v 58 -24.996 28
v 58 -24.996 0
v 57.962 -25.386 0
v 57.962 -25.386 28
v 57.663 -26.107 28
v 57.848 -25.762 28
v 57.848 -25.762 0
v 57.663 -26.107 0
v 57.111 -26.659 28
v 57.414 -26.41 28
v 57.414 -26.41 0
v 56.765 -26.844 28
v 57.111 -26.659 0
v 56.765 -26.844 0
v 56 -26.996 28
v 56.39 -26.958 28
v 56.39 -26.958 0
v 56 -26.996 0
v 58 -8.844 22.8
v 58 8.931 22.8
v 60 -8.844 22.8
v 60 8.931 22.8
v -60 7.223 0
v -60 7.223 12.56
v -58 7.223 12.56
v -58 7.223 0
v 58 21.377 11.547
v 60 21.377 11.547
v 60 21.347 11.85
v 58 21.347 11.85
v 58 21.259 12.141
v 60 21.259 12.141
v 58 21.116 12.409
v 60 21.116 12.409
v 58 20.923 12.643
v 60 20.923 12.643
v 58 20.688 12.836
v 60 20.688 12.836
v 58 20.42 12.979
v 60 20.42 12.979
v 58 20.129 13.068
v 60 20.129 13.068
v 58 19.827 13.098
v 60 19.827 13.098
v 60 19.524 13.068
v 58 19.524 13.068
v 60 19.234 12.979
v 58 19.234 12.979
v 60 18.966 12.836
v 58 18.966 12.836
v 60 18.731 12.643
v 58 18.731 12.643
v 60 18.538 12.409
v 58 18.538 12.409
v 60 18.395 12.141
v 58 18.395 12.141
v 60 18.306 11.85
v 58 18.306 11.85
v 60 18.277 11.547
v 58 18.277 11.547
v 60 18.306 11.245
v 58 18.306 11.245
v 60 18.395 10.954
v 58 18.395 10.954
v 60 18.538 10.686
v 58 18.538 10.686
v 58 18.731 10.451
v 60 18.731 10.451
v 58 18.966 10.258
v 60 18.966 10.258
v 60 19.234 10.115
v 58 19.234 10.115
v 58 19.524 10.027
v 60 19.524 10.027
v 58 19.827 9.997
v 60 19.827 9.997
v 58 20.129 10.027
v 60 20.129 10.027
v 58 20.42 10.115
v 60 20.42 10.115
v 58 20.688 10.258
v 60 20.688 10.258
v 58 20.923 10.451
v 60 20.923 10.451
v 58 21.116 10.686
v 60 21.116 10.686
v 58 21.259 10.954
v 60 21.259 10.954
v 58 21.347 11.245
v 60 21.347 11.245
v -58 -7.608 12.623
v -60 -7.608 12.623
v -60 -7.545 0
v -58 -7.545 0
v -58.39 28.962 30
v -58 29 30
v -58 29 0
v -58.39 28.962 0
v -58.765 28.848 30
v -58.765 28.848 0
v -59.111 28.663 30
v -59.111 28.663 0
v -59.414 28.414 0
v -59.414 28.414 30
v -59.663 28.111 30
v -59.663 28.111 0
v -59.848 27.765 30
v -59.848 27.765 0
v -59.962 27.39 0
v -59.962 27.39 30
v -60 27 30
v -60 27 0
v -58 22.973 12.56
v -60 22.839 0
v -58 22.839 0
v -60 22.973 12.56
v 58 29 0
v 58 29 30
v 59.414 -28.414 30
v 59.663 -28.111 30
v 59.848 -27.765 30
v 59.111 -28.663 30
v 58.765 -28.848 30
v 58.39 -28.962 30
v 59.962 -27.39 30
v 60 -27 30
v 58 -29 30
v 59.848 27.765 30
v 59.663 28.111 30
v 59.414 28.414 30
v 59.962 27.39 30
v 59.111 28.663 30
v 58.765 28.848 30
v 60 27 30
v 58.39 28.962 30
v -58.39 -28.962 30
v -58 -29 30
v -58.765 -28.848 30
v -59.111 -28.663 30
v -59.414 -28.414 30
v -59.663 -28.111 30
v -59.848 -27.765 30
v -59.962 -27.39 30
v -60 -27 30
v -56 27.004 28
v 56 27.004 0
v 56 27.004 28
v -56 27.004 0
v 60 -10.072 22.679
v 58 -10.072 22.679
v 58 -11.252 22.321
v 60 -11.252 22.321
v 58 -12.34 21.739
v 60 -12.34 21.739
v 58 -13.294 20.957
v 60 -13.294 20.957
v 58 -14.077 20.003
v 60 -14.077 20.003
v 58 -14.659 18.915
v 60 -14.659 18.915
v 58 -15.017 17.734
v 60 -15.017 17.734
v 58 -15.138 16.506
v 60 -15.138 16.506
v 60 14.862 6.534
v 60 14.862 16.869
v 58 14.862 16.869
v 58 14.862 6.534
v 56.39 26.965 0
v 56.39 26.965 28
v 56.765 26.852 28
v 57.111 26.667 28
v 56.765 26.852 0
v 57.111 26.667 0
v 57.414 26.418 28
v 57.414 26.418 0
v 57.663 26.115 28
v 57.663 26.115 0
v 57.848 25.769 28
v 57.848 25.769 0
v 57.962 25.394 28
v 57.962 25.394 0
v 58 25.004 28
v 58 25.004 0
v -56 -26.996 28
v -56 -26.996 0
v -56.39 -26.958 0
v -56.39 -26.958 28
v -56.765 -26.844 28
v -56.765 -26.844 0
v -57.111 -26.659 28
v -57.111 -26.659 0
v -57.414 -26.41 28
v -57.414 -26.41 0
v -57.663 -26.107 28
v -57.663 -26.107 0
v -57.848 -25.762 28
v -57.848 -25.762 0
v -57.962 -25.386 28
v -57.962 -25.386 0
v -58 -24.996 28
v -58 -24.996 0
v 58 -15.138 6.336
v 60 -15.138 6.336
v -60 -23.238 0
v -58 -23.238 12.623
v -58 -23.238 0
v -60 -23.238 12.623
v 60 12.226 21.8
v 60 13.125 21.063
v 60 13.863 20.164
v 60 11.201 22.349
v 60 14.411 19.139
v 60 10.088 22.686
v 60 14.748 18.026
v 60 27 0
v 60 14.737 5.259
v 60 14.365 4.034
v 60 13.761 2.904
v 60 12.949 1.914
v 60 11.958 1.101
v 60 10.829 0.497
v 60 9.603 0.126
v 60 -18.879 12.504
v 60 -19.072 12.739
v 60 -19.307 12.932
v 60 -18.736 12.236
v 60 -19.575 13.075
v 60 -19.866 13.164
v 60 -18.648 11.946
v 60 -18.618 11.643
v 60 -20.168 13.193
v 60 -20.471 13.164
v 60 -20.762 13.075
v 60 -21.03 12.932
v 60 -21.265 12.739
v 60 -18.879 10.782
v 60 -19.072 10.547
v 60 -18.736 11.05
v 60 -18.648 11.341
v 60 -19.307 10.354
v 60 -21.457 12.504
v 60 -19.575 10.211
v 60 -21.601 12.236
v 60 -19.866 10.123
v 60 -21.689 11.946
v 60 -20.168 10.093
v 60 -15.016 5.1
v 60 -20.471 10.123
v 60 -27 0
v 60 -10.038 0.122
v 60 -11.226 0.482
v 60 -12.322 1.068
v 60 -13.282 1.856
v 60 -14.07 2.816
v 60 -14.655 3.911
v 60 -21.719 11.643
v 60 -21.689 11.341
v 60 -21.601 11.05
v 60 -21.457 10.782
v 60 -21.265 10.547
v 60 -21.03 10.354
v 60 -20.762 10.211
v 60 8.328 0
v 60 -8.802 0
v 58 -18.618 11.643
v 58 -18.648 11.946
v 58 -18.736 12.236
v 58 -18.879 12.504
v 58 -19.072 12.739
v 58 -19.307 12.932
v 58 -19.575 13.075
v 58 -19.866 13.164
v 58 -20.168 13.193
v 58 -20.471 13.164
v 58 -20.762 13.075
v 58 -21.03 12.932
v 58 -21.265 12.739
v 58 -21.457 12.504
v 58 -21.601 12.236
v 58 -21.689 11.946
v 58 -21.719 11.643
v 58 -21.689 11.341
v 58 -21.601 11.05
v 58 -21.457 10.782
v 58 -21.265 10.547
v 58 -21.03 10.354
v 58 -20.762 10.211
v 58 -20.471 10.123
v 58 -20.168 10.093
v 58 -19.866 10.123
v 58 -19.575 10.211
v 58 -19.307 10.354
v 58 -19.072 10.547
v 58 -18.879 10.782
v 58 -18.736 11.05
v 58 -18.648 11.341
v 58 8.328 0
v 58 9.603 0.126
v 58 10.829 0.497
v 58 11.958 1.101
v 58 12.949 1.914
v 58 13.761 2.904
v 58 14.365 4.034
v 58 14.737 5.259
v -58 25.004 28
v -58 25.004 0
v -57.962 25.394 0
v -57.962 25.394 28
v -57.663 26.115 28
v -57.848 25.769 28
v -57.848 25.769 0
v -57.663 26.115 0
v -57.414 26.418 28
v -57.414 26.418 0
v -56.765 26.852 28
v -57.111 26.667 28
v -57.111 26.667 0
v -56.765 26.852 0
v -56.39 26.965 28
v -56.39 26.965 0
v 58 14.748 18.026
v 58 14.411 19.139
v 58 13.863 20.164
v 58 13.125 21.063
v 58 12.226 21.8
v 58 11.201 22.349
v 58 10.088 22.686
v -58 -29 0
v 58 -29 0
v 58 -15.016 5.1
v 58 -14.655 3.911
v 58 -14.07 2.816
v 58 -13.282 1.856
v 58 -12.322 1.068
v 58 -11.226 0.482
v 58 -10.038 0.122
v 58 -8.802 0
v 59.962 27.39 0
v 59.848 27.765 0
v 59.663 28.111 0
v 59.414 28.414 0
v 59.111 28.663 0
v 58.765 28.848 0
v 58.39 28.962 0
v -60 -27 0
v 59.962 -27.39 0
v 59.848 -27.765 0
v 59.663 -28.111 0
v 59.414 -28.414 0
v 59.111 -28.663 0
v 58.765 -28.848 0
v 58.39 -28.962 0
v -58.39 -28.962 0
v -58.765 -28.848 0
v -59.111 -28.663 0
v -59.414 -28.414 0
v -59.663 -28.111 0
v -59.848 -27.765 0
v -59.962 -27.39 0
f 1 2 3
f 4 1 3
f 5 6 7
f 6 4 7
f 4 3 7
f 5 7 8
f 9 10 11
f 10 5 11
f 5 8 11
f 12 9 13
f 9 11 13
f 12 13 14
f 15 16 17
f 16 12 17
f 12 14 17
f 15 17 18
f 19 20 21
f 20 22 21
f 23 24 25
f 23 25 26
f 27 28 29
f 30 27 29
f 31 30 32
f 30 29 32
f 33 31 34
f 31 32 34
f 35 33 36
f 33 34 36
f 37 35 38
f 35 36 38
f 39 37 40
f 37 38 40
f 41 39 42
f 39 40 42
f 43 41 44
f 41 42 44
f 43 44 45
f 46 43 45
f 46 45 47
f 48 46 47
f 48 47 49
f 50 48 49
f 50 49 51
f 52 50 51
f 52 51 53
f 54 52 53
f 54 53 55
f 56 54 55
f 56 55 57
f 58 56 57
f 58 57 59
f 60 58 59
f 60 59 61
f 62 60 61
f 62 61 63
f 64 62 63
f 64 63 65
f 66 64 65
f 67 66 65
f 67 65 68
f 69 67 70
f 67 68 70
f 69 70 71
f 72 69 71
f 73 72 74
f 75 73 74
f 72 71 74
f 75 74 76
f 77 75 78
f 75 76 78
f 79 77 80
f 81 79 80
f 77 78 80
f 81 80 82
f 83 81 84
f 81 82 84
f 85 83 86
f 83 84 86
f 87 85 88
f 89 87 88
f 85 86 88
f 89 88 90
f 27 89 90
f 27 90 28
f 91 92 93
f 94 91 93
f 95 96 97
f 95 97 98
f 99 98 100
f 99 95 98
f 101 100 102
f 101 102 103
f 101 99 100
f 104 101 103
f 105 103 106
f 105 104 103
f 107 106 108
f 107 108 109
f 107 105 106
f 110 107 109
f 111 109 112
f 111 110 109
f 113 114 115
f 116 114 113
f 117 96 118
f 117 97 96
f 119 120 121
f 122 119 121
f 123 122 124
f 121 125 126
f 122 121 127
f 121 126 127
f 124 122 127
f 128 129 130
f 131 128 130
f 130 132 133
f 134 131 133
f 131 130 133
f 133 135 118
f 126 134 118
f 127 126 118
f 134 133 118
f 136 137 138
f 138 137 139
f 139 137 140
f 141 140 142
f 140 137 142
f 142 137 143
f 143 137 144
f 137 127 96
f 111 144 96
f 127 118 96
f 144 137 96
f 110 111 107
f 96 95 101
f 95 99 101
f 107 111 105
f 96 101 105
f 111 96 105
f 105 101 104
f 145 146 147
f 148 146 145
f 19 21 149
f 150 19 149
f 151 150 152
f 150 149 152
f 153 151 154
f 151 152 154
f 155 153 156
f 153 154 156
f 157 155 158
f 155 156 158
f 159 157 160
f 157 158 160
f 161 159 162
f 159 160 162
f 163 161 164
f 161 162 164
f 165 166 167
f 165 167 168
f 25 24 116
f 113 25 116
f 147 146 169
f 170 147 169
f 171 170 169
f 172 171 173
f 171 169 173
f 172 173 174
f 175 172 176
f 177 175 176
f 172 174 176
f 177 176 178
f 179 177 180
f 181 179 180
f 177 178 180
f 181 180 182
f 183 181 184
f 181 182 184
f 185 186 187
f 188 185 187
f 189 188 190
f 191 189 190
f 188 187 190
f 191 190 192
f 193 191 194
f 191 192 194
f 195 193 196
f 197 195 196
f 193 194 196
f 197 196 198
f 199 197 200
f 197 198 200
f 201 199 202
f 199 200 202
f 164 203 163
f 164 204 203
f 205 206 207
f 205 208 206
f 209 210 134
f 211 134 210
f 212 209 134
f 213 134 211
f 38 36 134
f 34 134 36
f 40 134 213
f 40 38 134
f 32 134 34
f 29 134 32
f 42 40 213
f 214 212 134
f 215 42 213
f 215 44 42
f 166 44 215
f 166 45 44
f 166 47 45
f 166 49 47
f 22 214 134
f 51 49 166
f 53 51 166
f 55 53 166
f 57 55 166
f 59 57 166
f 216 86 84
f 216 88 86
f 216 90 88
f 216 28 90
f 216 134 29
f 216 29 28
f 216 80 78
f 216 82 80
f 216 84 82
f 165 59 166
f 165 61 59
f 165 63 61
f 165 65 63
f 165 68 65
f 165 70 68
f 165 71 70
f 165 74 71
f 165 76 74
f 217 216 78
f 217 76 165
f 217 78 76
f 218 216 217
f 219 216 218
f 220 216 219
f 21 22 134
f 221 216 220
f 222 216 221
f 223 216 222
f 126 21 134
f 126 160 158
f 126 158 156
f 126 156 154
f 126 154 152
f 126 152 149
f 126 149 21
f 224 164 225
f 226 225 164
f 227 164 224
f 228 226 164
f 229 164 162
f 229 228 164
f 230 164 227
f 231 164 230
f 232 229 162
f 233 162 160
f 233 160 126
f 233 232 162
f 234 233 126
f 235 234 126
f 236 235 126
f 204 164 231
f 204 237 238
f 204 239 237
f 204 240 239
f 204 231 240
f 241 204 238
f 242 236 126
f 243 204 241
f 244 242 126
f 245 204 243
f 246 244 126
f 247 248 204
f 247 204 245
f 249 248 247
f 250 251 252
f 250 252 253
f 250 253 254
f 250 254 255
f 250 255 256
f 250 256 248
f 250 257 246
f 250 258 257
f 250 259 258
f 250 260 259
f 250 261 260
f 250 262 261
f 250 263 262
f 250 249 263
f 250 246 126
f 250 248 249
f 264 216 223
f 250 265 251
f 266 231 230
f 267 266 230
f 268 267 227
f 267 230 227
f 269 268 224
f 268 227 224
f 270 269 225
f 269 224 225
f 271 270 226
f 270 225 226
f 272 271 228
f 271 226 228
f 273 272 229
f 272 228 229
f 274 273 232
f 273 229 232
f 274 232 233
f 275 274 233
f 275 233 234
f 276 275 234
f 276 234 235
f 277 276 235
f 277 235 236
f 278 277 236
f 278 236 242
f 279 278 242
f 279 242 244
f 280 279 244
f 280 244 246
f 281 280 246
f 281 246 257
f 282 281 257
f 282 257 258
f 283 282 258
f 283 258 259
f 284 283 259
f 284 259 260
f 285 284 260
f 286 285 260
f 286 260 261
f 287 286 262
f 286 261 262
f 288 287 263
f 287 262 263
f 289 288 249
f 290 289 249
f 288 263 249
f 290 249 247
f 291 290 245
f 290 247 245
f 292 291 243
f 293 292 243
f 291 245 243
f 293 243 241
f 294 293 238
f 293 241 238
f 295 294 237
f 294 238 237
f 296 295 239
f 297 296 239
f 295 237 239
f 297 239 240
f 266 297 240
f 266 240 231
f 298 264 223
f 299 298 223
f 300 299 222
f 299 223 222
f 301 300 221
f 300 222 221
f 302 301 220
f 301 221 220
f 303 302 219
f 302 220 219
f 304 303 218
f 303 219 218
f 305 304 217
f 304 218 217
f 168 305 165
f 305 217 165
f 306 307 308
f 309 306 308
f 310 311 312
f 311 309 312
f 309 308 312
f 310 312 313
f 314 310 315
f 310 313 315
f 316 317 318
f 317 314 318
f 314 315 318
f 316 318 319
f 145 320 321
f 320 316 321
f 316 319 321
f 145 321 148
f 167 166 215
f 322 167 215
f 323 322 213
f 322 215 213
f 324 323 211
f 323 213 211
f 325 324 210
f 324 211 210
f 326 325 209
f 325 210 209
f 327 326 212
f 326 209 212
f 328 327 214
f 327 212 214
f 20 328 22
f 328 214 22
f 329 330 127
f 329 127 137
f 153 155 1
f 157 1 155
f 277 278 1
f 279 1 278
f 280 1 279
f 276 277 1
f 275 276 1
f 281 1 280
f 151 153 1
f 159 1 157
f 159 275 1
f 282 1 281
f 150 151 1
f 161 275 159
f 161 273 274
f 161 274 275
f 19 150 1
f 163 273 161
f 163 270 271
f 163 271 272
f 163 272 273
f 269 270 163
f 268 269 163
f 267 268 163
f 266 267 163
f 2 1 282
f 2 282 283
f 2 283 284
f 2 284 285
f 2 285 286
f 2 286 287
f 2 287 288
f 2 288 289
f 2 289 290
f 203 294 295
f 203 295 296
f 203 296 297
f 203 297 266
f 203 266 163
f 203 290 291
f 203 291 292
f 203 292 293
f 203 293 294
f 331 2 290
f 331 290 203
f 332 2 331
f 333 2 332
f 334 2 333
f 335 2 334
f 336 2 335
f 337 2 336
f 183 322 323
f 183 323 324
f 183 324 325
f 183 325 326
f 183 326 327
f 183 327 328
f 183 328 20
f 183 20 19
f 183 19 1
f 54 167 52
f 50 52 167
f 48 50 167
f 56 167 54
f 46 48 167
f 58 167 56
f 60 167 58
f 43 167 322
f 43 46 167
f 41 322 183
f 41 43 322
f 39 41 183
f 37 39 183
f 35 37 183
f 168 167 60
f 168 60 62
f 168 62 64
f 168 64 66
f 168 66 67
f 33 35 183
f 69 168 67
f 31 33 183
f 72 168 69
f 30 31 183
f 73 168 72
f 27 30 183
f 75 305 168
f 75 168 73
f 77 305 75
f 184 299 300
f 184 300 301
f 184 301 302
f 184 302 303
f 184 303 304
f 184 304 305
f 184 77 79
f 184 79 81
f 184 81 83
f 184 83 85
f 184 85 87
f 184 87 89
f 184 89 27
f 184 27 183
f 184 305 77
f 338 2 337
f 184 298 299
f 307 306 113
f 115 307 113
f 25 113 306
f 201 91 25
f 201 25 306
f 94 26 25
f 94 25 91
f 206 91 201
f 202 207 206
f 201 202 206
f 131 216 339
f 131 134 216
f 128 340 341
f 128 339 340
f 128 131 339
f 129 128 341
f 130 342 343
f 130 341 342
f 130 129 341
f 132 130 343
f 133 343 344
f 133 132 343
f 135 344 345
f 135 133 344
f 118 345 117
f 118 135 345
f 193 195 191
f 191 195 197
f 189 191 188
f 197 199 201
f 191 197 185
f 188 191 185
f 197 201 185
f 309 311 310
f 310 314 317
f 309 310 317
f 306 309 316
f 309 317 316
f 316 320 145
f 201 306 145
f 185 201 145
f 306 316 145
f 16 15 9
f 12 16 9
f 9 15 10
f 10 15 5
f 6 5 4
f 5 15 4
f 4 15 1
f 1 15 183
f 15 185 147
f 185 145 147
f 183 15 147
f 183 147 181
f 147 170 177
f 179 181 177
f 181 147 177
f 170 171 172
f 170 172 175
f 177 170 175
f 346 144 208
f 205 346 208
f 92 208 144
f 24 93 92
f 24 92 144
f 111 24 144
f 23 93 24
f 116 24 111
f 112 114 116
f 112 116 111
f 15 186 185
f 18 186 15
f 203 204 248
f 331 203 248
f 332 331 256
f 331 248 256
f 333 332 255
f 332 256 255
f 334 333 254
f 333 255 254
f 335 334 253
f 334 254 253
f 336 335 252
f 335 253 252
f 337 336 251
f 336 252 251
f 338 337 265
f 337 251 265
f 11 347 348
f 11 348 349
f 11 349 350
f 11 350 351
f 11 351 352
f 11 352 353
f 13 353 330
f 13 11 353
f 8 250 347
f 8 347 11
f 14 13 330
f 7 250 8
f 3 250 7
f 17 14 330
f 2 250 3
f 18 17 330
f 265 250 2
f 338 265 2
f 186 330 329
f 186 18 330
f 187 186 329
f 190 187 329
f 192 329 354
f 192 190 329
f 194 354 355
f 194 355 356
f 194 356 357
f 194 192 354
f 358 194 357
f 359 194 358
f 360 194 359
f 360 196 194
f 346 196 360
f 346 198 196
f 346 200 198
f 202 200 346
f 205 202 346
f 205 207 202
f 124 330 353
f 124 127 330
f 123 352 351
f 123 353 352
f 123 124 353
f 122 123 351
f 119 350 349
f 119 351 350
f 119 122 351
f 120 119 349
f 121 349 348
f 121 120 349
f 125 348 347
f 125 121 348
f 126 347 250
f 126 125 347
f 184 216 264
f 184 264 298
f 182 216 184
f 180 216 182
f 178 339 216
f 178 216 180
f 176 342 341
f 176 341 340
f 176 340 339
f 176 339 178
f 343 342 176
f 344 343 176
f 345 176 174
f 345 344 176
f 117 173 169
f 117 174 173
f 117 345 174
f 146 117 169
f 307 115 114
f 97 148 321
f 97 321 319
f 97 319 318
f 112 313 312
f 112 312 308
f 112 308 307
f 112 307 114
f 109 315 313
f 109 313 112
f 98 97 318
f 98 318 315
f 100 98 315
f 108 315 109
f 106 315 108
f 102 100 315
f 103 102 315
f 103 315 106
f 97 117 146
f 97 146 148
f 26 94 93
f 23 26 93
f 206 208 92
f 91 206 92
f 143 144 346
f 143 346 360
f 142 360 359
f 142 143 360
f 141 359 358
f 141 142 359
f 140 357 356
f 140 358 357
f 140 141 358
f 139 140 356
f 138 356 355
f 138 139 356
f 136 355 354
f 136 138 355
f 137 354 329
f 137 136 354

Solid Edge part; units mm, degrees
sketch "Sketch1" plane through (0, 0, 0) normal (0, 0, 1) x (1, 0, 0)
  line L0 (-60, 29) -> (60, 29)
  line L1 (60, 29) -> (60, -29)
  line L2 (60, -29) -> (-60, -29)
  line L3 (-60, -29) -> (-60, 29)
  dimension "D1" = 120
  dimension "D2" = 58
extrude "Protrusion1" add sketch "Sketch1" along normal blind 30
fillet "Redondo_1" radius 2 4 edges at (60, 29, 15) (60, -29, 15) (-60, 29, 15) (-60, -29, 15)
sketch "Sketch2" plane through (0, 0, 0) normal (0, 0, -1) x (-1, 0, 0)
  line L0 (-56, 27.0038) -> (56, 27.0038)
  arc A0 (56, 27.0038) -> (58, 25.0038) centre (56, 25.0038) cw
  line L1 (58, 25.0038) -> (58, -24.9962)
  arc A1 (56, -26.9962) -> (58, -24.9962) centre (56, -24.9962) ccw
  line L2 (56, -26.9962) -> (-56, -26.9962)
  arc A2 (-56, -26.9962) -> (-58, -24.9962) centre (-56, -24.9962) cw
  line L3 (-58, -24.9962) -> (-58, 25.0038)
  arc A3 (-56, 27.0038) -> (-58, 25.0038) centre (-56, 25.0038) ccw
  dimension "D1" = 2.0038
  dimension "D2" = 2
extrude "Cutout1" cut sketch "Sketch2" against normal blind 28
sketch "Sketch3" plane through (60, 0, 15) normal (1, 0, 0) x (0, 1, 0)
  circle A0 centre (19.8269, -3.4527) radius 1.5502
  circle A1 centre (-20.1684, -3.3569) radius 1.5502
  line L0 (14.8624, 1.8687) -> (14.8624, -8.466)
  arc A2 (14.8624, -8.466) -> (8.3284, -15) centre (8.3284, -8.466) cw
  line L1 (-8.8017, -15) -> (8.3284, -15)
  arc A3 (-8.8017, -15) -> (-15.1376, -8.6641) centre (-8.8017, -8.6641) cw
  line L2 (-15.1376, -8.6641) -> (-15.1376, 1.5062)
  arc A4 (-15.1376, 1.5062) -> (-8.8438, 7.8) centre (-8.8438, 1.5062) cw
  line L3 (8.9311, 7.8) -> (-8.8438, 7.8)
  arc A5 (8.9311, 7.8) -> (14.8624, 1.8687) centre (8.9311, 1.8687) cw
extrude "Recorte_Extrudado_3" cut sketch "Sketch3" against normal blind 5
sketch "Sketch4" plane through (-60, 0, 15) normal (-1, 0, 0) x (0, -1, 0)
  line L0 (-7.2229, -2.44) -> (-22.9734, -2.44)
  line L1 (-22.8392, -15) -> (-22.9734, -2.44)
  line L2 (-7.2229, -15) -> (-22.8392, -15)
  line L3 (-7.2229, -2.44) -> (-7.2229, -15)
  line L4 (23.2376, -2.377) -> (7.6078, -2.377)
  line L5 (7.6078, -2.377) -> (7.5447, -15)
  line L6 (7.5447, -15) -> (23.2376, -15)
  line L7 (23.2376, -2.377) -> (23.2376, -15)
extrude "Recorte_Extrudado_4" cut sketch "Sketch4" against normal blind 4
